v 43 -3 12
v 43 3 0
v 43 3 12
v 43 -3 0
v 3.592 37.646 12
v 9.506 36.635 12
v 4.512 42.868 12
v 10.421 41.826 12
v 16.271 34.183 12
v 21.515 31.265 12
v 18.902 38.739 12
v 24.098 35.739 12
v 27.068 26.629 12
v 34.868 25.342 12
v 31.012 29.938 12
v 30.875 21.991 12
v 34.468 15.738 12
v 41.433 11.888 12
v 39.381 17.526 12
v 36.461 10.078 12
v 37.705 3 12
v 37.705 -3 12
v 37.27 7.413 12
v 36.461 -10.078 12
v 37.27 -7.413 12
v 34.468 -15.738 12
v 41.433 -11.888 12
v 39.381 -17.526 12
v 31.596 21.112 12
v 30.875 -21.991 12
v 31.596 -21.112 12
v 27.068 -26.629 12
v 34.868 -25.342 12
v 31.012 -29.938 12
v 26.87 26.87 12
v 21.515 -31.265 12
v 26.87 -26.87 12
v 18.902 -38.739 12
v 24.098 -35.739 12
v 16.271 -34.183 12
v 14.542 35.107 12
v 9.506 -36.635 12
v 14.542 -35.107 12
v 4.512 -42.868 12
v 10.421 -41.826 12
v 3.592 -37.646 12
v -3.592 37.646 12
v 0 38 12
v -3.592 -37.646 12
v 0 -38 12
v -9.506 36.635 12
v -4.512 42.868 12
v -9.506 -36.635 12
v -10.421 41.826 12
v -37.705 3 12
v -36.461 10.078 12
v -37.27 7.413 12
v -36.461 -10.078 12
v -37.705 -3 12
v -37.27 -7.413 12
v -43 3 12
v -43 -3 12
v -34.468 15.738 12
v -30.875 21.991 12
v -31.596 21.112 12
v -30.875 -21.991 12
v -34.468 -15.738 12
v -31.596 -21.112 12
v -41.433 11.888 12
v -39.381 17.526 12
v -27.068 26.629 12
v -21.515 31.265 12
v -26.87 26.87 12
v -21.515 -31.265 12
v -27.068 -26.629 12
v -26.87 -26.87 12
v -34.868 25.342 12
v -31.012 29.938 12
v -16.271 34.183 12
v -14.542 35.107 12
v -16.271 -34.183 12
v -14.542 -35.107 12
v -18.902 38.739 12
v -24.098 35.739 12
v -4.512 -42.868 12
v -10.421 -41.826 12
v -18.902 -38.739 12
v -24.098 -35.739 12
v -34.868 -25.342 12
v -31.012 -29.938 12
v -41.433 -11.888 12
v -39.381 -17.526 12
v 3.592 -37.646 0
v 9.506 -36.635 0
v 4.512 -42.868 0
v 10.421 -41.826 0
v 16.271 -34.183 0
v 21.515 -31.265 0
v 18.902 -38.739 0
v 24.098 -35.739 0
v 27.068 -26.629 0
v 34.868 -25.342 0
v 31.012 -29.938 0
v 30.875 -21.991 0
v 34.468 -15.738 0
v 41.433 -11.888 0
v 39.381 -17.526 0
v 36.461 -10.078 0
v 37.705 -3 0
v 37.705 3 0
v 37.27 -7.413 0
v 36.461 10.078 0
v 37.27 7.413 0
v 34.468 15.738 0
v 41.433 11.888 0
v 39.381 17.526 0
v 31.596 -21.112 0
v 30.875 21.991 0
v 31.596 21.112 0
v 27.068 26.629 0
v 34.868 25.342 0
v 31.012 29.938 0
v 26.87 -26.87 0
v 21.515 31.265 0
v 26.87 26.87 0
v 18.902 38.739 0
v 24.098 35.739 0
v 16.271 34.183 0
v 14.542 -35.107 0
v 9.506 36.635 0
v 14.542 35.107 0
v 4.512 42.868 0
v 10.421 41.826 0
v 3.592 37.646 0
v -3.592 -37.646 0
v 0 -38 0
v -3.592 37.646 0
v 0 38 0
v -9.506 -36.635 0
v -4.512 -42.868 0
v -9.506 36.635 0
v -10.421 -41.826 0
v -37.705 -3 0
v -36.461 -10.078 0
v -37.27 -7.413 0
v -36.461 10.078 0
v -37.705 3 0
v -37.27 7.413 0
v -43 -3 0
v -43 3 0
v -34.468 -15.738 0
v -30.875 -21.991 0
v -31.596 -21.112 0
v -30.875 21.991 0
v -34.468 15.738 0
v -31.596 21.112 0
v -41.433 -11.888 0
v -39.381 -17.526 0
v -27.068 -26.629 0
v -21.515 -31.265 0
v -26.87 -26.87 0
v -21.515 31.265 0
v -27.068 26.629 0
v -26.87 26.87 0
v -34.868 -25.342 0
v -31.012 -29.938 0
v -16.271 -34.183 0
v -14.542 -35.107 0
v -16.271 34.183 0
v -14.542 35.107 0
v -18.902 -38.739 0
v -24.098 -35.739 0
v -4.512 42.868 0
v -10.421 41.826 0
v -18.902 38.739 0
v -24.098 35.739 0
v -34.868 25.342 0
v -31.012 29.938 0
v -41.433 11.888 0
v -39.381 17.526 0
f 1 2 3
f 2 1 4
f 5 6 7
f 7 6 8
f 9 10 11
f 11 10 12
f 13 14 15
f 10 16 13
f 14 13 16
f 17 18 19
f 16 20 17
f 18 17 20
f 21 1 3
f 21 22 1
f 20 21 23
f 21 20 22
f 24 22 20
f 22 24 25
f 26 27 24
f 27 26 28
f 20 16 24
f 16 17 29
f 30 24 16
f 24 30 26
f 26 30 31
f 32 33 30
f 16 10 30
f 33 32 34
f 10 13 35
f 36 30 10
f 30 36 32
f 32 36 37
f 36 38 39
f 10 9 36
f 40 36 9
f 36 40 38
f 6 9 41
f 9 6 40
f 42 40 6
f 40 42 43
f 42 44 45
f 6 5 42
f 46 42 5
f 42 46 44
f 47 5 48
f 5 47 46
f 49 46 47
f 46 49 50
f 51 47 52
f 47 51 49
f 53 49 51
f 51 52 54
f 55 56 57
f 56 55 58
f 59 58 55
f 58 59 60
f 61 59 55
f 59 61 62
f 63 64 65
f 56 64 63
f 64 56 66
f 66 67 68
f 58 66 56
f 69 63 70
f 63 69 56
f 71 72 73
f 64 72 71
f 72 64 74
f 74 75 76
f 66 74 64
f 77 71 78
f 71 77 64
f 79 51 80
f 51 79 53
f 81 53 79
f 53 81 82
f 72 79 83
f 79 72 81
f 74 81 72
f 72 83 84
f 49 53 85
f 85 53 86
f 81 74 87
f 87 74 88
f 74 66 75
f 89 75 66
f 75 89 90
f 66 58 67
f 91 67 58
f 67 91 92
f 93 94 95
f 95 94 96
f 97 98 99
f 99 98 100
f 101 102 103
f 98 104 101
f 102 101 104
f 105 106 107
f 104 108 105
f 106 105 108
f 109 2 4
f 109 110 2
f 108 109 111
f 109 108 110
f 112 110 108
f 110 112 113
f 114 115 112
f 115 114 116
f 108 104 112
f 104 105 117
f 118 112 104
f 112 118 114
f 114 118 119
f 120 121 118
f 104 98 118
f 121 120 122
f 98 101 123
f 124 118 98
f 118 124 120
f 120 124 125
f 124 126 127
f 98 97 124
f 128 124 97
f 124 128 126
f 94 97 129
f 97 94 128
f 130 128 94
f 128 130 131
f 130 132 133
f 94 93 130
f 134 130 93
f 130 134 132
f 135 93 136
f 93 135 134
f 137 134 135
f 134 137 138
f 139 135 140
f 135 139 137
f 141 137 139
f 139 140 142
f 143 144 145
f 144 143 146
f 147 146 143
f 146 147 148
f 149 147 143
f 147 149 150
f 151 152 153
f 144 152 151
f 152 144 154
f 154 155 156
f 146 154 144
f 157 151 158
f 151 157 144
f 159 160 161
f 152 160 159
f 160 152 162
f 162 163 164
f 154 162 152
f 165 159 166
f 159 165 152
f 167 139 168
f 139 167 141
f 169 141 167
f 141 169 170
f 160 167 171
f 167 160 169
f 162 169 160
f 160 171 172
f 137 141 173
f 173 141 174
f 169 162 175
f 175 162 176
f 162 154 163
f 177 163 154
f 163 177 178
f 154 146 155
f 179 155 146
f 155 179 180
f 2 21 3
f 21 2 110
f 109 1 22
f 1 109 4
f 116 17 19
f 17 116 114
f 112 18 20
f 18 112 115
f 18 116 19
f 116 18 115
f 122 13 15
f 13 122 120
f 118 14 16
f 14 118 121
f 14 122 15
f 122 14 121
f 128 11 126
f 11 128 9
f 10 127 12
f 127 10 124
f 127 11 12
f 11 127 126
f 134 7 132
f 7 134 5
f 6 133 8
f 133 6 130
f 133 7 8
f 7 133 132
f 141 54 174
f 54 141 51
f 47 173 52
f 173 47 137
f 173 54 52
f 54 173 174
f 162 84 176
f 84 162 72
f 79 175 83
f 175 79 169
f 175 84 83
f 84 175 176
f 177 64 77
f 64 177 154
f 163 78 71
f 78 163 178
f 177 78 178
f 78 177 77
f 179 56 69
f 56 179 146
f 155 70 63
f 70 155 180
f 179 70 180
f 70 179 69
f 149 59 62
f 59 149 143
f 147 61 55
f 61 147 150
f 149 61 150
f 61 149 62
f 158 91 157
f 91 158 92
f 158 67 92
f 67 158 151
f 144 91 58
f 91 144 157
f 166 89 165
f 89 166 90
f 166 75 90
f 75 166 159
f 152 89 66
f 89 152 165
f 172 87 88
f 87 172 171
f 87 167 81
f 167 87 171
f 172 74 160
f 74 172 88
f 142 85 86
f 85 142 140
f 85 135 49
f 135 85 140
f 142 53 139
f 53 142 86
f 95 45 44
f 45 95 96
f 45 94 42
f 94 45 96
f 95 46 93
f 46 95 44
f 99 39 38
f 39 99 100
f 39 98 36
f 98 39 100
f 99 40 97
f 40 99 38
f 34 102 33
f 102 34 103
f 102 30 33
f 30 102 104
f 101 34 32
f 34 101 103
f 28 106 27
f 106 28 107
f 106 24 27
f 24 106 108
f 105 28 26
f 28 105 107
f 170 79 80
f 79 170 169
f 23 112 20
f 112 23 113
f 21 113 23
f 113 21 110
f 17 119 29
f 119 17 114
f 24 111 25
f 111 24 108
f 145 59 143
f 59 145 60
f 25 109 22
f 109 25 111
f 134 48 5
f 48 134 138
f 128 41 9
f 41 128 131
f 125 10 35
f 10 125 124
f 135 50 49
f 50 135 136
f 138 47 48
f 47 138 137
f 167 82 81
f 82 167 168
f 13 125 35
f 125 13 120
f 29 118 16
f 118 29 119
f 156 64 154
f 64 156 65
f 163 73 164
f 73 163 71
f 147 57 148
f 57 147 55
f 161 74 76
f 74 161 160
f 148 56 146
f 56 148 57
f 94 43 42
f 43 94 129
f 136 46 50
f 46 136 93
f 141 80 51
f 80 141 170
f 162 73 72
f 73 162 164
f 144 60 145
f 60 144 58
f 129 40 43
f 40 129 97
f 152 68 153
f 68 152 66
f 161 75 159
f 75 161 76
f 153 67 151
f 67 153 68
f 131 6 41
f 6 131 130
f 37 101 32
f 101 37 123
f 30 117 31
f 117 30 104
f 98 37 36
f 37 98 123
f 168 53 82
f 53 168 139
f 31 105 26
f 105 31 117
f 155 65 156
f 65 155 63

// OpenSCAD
$fn = 32;

// ----------------------------------------------------------------------
// Spur blank: plain gear blank
// ----------------------------------------------------------------------

// --- parameters (mm) ---
disc_r = 38;              // blank root radius
disc_t = 12;              // blank thickness
n_teeth = 18;             // stub tooth count
tooth_w = 6;              // tooth width at the root
tooth_h = 5;              // tooth height above the root
fit_tol = 0.02;           // tolerance for press fits, mm
free_tol = 0.2;           // tolerance for clearance fits, mm

out_r = disc_r + tooth_h;  // tip radius
bbox_x = 86.0;  // measured width over the teeth
bbox_y = 85.74;  // measured depth over the teeth

union() {
  cylinder(r = disc_r, h = disc_t);
  for (i = [0 : n_teeth - 1])
    rotate([0, 0, i * 360 / n_teeth])
      translate([disc_r - 1, -tooth_w / 2, 0])
        cube([tooth_h + 1, tooth_w, disc_t]);
}
